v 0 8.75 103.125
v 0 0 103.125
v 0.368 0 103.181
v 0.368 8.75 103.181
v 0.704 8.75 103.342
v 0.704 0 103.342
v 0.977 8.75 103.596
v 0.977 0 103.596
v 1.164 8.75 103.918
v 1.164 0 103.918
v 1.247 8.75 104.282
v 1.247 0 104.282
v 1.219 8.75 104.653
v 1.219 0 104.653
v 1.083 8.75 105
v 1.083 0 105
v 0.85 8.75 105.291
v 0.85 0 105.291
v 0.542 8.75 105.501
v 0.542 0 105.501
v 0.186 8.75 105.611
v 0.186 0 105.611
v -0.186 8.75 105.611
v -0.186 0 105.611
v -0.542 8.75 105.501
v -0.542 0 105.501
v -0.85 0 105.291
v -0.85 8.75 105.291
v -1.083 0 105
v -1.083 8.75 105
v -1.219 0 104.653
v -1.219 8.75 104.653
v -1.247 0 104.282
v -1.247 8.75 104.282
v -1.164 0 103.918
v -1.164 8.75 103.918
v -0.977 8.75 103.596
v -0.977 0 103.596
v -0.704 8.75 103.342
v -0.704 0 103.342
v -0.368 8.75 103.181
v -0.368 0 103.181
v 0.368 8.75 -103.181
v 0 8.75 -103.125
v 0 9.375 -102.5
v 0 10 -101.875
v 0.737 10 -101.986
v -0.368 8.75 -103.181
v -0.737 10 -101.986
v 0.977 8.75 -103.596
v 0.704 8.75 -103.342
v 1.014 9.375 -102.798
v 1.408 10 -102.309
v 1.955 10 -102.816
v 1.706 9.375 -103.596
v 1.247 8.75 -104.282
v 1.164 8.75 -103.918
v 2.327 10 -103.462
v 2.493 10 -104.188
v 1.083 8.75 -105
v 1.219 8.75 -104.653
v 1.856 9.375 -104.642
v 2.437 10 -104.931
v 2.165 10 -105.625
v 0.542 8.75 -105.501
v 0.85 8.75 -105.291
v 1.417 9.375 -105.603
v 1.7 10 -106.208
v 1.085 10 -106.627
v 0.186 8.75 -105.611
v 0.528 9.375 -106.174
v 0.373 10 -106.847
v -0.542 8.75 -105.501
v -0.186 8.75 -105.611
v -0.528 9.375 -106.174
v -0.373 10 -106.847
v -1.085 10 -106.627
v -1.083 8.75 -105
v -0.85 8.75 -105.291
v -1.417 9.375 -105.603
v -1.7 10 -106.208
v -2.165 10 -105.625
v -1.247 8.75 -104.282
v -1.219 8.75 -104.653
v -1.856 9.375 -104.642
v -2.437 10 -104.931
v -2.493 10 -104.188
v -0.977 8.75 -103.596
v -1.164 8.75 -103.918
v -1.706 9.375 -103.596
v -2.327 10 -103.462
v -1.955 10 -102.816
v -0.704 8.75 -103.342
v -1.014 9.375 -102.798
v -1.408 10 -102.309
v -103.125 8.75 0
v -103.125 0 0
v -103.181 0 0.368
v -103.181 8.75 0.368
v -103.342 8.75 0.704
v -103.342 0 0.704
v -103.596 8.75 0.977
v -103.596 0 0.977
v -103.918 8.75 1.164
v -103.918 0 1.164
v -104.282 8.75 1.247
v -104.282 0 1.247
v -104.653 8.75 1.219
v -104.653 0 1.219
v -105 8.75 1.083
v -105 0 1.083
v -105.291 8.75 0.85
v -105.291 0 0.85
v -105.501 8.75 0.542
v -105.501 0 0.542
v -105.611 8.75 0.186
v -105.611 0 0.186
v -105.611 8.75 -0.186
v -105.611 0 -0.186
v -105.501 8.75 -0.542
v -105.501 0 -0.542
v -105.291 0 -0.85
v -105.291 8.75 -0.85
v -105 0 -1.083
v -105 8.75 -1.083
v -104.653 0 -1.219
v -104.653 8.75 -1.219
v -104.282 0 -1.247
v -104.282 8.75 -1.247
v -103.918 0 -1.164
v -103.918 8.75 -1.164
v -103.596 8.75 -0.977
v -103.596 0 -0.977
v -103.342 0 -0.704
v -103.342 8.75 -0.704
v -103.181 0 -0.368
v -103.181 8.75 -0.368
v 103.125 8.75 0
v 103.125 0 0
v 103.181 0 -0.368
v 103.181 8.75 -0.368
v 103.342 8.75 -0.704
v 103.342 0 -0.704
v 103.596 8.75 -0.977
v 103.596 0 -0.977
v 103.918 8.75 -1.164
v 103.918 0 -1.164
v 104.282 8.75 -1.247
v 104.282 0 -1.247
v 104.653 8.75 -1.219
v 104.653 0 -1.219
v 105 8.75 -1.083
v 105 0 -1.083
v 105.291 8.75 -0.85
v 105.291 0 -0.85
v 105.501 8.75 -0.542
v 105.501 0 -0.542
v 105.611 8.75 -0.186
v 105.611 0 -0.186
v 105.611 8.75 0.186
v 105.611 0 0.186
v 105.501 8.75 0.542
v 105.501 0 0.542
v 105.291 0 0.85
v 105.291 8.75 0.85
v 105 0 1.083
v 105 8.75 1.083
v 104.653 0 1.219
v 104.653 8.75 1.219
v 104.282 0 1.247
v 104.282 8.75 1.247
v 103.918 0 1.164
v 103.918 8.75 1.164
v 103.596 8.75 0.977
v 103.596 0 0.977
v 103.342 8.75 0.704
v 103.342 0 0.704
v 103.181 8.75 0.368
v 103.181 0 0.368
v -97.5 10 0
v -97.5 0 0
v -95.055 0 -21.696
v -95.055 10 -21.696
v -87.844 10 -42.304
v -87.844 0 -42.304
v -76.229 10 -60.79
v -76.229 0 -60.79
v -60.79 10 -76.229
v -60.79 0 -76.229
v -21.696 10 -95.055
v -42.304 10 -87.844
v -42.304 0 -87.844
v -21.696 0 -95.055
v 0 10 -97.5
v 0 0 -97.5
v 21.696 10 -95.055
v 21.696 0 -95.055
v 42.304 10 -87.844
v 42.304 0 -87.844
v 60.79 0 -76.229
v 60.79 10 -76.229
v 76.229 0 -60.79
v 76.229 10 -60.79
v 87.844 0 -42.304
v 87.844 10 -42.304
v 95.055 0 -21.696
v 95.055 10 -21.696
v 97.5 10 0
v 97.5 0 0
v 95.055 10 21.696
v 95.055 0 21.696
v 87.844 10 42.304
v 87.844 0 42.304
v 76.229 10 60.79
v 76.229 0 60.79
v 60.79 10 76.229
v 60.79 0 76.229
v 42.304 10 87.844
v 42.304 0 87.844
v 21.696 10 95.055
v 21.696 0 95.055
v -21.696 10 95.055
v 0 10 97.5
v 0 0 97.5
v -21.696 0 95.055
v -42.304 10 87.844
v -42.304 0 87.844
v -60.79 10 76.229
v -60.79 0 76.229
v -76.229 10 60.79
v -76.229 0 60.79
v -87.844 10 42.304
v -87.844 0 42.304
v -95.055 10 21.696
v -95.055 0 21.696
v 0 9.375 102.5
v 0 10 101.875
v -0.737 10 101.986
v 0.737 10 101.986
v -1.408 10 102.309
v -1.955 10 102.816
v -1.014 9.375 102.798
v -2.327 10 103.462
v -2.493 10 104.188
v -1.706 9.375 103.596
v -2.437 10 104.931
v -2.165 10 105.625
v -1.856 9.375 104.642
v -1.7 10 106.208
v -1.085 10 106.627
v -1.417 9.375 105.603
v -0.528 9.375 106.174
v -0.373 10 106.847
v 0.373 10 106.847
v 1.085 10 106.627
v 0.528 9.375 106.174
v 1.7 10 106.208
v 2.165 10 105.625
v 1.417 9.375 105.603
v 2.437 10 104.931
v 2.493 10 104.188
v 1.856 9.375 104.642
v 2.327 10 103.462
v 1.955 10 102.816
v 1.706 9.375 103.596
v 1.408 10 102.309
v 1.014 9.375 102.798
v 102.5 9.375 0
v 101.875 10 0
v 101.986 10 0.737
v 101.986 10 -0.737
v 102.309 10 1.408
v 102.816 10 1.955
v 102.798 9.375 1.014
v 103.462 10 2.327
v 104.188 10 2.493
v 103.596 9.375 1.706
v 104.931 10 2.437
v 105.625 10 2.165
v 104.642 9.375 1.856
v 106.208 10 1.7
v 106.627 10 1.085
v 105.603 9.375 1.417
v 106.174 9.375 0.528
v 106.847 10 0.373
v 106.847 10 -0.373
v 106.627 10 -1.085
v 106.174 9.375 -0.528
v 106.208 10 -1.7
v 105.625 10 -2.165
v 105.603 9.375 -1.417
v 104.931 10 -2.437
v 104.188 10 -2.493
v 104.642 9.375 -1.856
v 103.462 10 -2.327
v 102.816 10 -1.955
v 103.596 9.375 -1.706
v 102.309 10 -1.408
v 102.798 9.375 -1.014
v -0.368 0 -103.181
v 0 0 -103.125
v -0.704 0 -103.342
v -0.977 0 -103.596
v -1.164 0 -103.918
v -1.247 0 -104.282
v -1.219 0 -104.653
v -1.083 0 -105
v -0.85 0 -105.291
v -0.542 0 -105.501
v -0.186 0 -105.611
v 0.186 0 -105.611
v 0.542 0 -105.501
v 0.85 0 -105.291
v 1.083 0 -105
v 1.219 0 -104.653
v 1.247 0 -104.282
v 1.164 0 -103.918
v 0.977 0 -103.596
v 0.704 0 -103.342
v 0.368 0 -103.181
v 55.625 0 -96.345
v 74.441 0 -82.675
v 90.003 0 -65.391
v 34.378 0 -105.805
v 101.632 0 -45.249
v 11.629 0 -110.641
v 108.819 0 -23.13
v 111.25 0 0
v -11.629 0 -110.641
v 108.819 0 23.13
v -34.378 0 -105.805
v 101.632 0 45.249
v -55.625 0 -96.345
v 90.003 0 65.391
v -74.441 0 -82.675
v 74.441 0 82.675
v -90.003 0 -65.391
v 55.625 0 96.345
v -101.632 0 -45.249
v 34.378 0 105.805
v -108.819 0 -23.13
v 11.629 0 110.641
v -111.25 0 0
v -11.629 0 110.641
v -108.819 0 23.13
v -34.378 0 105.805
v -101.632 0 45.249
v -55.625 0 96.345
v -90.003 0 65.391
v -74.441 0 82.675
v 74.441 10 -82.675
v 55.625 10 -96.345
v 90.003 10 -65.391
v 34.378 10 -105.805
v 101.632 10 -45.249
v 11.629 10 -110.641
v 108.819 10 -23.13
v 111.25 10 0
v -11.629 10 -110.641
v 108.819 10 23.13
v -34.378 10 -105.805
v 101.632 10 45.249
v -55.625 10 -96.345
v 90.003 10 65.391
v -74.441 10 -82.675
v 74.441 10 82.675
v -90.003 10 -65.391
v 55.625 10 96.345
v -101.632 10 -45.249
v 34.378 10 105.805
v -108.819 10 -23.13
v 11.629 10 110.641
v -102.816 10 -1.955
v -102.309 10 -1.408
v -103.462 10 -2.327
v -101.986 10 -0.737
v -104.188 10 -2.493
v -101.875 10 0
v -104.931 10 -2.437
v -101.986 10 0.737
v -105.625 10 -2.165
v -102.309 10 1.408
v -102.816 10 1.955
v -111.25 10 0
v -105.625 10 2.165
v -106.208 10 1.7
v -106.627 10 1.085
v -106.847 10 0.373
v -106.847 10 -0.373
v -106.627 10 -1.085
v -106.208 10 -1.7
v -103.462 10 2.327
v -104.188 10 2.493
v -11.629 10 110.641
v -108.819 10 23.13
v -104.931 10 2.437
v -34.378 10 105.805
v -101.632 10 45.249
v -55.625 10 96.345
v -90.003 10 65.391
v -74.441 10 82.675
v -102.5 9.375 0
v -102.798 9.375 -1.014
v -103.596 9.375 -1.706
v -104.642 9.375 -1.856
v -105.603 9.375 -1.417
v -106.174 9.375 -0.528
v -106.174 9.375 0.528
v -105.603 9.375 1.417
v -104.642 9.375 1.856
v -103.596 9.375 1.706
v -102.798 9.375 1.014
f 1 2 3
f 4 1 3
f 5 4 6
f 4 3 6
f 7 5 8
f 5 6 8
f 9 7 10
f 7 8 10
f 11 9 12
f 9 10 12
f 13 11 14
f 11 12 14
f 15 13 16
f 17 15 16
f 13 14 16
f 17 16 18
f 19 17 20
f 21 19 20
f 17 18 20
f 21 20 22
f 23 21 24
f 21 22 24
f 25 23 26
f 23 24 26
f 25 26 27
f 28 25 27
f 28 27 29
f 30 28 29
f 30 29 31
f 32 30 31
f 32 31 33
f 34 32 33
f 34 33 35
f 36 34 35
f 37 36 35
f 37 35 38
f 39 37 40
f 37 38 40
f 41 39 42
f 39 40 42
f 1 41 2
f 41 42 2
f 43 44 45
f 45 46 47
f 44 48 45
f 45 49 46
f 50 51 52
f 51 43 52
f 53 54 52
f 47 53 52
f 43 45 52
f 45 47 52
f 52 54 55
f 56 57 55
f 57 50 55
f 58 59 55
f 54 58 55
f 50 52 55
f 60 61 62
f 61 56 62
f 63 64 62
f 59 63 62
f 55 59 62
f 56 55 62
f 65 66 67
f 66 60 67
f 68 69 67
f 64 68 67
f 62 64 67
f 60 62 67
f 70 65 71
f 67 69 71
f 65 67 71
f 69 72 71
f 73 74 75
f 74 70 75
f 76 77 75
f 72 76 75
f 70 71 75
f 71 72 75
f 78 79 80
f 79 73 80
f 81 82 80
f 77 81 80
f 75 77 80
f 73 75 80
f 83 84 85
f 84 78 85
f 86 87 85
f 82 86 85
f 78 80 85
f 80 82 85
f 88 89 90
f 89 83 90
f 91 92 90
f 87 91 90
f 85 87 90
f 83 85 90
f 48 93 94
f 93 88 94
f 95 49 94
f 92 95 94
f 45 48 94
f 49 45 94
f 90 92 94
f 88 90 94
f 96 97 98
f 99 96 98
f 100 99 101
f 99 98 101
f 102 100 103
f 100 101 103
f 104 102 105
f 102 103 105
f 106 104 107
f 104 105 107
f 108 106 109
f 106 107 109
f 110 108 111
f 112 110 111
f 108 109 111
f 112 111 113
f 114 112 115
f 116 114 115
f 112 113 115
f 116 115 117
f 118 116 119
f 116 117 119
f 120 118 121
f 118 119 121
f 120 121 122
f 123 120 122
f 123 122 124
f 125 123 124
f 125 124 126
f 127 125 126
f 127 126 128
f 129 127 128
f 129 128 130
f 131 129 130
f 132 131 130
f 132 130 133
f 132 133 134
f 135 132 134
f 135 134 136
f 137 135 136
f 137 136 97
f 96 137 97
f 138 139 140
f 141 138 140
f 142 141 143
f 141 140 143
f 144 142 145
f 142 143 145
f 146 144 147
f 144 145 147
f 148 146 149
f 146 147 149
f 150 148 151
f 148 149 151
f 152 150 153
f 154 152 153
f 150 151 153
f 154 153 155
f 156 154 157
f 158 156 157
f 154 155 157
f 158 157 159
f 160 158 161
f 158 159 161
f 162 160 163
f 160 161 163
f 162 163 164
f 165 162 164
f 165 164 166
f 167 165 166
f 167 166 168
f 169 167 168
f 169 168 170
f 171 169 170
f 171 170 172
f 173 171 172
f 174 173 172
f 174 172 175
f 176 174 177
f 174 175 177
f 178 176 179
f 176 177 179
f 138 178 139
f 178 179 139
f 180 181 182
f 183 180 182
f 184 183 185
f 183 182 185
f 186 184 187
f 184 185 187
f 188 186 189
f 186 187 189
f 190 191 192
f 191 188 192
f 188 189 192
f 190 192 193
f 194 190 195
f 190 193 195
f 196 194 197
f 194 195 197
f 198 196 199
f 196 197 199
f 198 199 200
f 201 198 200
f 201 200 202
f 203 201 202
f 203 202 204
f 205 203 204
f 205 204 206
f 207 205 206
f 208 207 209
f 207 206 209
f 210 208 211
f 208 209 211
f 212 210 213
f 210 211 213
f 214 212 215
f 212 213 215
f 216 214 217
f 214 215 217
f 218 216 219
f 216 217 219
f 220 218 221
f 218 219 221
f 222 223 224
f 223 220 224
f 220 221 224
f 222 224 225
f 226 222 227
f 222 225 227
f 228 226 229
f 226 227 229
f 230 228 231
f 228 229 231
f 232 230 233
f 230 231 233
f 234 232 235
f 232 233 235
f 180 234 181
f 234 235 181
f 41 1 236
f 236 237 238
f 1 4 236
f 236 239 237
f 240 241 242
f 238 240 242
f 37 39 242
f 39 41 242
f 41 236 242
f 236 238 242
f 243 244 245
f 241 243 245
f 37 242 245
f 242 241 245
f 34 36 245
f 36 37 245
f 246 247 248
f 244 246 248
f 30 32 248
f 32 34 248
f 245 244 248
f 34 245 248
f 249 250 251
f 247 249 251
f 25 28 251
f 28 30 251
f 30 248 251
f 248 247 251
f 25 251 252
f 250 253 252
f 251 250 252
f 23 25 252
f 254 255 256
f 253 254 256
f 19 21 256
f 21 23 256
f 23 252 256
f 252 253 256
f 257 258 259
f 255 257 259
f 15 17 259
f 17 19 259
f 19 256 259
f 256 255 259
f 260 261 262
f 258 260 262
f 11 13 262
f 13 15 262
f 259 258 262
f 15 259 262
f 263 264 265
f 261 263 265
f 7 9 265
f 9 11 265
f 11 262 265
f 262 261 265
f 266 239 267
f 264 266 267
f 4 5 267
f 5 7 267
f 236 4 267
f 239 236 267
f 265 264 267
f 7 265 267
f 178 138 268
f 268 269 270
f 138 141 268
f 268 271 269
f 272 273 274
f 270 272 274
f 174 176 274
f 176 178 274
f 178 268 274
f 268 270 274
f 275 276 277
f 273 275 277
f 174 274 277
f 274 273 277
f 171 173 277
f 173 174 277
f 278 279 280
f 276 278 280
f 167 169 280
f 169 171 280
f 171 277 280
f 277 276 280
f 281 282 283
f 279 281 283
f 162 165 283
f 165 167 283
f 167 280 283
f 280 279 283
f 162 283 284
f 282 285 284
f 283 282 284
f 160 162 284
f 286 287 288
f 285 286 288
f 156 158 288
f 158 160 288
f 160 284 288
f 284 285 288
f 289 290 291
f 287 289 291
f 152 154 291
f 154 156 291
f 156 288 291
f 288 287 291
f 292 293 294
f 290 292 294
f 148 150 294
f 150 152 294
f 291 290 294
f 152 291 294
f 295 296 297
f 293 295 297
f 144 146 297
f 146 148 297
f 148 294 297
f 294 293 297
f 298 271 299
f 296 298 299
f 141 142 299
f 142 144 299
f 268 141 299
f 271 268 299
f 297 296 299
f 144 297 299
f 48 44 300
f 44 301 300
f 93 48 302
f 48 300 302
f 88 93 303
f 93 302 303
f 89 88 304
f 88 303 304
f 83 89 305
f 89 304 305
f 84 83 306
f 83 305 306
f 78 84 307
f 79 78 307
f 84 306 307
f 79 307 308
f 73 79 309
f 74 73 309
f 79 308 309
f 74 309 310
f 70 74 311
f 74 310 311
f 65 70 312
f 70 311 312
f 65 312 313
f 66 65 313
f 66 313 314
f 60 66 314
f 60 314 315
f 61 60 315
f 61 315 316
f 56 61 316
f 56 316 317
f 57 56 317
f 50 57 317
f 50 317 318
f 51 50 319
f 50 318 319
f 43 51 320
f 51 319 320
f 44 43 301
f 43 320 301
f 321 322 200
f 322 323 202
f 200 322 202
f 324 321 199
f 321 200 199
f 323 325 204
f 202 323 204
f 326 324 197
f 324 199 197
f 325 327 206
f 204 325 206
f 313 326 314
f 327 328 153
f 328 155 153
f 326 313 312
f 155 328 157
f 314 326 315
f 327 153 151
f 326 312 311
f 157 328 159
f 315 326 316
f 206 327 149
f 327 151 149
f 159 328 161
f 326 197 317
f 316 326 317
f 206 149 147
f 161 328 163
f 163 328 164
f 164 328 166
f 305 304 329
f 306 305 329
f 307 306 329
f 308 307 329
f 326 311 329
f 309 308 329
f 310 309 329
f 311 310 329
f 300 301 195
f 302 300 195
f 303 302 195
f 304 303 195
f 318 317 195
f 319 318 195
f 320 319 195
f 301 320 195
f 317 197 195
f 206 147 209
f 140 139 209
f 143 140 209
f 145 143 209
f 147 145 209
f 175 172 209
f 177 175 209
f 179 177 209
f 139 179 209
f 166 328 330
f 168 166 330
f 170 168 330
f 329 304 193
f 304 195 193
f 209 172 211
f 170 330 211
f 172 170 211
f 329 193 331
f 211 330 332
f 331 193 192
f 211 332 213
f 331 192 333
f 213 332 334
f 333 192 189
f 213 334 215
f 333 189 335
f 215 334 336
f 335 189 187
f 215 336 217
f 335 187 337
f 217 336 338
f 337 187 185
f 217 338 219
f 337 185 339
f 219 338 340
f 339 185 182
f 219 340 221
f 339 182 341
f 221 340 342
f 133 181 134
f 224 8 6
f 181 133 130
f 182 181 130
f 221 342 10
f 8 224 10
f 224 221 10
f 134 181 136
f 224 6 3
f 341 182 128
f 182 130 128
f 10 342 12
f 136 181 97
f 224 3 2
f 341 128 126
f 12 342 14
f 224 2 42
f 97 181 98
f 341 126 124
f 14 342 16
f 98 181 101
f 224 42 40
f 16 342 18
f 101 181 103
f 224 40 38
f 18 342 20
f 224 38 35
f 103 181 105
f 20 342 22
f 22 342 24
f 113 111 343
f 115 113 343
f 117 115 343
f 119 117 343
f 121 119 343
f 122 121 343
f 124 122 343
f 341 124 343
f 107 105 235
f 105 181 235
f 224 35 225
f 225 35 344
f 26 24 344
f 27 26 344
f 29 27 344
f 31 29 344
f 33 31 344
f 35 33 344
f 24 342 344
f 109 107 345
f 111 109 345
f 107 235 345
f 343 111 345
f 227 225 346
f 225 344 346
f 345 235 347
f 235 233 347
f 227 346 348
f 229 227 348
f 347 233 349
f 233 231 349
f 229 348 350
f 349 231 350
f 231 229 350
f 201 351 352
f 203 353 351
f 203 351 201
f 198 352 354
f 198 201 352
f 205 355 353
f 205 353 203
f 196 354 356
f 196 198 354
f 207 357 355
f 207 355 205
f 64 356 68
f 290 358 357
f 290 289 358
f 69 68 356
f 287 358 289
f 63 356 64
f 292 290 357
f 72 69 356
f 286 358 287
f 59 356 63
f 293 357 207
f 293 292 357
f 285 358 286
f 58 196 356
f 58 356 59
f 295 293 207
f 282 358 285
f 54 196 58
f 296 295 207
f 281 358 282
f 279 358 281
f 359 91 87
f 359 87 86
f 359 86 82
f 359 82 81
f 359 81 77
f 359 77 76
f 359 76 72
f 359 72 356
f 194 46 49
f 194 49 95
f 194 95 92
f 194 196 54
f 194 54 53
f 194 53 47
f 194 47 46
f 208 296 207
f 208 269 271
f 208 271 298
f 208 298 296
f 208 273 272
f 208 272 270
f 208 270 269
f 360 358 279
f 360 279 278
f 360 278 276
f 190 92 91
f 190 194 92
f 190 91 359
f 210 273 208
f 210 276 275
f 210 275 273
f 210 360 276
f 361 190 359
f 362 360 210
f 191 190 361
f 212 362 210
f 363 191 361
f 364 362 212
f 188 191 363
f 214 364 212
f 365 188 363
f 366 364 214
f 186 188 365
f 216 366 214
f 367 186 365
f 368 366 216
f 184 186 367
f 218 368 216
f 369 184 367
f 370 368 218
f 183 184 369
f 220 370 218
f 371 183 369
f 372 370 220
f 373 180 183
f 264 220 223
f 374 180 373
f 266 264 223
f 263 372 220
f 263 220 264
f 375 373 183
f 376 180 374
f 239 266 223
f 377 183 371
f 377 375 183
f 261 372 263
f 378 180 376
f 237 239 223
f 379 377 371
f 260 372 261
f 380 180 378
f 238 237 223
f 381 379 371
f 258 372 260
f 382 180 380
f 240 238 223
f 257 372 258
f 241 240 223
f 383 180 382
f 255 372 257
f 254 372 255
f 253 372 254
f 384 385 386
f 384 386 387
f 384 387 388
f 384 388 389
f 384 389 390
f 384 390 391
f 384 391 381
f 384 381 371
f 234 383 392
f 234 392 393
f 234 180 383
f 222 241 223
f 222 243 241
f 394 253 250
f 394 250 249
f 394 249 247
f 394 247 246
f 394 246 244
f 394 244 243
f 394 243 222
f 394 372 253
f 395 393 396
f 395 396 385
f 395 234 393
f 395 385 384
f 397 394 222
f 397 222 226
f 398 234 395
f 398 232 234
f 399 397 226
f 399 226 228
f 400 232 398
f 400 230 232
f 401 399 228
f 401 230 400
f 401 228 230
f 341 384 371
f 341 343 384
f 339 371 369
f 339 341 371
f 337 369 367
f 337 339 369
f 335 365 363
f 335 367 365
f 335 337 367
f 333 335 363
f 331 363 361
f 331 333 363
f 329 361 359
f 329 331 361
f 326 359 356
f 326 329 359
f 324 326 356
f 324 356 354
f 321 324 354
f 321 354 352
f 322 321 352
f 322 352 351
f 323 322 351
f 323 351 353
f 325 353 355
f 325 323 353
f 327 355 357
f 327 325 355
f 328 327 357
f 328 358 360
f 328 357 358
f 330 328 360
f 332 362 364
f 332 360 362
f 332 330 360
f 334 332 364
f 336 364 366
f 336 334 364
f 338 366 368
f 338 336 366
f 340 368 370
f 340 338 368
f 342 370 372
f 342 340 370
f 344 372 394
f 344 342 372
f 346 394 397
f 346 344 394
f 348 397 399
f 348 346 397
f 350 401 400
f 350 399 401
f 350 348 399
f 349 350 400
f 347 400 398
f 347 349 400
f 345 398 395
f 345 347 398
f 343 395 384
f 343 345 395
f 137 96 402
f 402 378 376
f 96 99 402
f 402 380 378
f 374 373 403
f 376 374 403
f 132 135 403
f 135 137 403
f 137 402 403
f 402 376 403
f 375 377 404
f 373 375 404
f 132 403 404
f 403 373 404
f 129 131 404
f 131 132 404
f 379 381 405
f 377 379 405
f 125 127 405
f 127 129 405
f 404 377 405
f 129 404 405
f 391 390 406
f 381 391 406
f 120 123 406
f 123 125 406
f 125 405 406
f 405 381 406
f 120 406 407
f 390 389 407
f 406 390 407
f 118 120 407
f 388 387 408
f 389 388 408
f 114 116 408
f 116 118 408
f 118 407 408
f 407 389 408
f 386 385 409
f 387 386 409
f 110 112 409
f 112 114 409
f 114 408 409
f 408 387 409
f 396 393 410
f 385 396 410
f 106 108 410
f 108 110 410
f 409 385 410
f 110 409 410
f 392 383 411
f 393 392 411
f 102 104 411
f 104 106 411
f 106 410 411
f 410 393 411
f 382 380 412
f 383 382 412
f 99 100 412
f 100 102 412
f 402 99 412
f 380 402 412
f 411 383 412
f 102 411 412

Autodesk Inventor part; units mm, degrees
ref_plane "YZ Plane" through (0, 0, 0) normal (1, 0, 0) x (0, 1, 0)
ref_plane "XZ Plane" through (0, 0, 0) normal (0, 1, 0) x (-1, 0, 0)
ref_plane "XY Plane" through (0, 0, 0) normal (0, 0, 1) x (1, 0, 0)
sketch "Sketch1" plane through (0, 0, 0) normal (0, 1, 0) x (-1, 0, 0)
  circle A0 centre (0, 0) radius 97.5
  circle A1 centre (0, 0) radius 111.25
  dimension "d0" = 195
  dimension "d1" = 222.5
extrude "Extrusion1" add sketch "Sketch1" along normal blind 10
sketch "Sketch2" plane through (0, 10, 0) normal (0, 1, 0) x (1, 0, 0)
  line L0 (0, 0) -> (0, 104.375)
  dimension "d4" = 104.375
hole "Hole1" at (0, 10, -104.375) direction (0, -1, 0) diameter 2.5 end through all countersink diameter 5 countersink angle 90
pattern_circular "Circular Pattern1" count 4 over 360 about axis through (0, -10, 0) along (0, 1, 0) of "Hole1"
sketch "Sketch3" plane through (0, 10, 0) normal (0, 1, 0) x (1, 0, 0)
  circle A0 centre (-104.375, 0) radius 1.25 projected
  line L0 (-104.375, 0) -> (0, 0)
  circle A1 centre (0, 104.375) radius 1.25 projected
  line L1 (0, 0) -> (0, 104.375)
  line L2 (0, 104.375) -> (-104.375, 0)
properties part number "InnerBearingTable"
